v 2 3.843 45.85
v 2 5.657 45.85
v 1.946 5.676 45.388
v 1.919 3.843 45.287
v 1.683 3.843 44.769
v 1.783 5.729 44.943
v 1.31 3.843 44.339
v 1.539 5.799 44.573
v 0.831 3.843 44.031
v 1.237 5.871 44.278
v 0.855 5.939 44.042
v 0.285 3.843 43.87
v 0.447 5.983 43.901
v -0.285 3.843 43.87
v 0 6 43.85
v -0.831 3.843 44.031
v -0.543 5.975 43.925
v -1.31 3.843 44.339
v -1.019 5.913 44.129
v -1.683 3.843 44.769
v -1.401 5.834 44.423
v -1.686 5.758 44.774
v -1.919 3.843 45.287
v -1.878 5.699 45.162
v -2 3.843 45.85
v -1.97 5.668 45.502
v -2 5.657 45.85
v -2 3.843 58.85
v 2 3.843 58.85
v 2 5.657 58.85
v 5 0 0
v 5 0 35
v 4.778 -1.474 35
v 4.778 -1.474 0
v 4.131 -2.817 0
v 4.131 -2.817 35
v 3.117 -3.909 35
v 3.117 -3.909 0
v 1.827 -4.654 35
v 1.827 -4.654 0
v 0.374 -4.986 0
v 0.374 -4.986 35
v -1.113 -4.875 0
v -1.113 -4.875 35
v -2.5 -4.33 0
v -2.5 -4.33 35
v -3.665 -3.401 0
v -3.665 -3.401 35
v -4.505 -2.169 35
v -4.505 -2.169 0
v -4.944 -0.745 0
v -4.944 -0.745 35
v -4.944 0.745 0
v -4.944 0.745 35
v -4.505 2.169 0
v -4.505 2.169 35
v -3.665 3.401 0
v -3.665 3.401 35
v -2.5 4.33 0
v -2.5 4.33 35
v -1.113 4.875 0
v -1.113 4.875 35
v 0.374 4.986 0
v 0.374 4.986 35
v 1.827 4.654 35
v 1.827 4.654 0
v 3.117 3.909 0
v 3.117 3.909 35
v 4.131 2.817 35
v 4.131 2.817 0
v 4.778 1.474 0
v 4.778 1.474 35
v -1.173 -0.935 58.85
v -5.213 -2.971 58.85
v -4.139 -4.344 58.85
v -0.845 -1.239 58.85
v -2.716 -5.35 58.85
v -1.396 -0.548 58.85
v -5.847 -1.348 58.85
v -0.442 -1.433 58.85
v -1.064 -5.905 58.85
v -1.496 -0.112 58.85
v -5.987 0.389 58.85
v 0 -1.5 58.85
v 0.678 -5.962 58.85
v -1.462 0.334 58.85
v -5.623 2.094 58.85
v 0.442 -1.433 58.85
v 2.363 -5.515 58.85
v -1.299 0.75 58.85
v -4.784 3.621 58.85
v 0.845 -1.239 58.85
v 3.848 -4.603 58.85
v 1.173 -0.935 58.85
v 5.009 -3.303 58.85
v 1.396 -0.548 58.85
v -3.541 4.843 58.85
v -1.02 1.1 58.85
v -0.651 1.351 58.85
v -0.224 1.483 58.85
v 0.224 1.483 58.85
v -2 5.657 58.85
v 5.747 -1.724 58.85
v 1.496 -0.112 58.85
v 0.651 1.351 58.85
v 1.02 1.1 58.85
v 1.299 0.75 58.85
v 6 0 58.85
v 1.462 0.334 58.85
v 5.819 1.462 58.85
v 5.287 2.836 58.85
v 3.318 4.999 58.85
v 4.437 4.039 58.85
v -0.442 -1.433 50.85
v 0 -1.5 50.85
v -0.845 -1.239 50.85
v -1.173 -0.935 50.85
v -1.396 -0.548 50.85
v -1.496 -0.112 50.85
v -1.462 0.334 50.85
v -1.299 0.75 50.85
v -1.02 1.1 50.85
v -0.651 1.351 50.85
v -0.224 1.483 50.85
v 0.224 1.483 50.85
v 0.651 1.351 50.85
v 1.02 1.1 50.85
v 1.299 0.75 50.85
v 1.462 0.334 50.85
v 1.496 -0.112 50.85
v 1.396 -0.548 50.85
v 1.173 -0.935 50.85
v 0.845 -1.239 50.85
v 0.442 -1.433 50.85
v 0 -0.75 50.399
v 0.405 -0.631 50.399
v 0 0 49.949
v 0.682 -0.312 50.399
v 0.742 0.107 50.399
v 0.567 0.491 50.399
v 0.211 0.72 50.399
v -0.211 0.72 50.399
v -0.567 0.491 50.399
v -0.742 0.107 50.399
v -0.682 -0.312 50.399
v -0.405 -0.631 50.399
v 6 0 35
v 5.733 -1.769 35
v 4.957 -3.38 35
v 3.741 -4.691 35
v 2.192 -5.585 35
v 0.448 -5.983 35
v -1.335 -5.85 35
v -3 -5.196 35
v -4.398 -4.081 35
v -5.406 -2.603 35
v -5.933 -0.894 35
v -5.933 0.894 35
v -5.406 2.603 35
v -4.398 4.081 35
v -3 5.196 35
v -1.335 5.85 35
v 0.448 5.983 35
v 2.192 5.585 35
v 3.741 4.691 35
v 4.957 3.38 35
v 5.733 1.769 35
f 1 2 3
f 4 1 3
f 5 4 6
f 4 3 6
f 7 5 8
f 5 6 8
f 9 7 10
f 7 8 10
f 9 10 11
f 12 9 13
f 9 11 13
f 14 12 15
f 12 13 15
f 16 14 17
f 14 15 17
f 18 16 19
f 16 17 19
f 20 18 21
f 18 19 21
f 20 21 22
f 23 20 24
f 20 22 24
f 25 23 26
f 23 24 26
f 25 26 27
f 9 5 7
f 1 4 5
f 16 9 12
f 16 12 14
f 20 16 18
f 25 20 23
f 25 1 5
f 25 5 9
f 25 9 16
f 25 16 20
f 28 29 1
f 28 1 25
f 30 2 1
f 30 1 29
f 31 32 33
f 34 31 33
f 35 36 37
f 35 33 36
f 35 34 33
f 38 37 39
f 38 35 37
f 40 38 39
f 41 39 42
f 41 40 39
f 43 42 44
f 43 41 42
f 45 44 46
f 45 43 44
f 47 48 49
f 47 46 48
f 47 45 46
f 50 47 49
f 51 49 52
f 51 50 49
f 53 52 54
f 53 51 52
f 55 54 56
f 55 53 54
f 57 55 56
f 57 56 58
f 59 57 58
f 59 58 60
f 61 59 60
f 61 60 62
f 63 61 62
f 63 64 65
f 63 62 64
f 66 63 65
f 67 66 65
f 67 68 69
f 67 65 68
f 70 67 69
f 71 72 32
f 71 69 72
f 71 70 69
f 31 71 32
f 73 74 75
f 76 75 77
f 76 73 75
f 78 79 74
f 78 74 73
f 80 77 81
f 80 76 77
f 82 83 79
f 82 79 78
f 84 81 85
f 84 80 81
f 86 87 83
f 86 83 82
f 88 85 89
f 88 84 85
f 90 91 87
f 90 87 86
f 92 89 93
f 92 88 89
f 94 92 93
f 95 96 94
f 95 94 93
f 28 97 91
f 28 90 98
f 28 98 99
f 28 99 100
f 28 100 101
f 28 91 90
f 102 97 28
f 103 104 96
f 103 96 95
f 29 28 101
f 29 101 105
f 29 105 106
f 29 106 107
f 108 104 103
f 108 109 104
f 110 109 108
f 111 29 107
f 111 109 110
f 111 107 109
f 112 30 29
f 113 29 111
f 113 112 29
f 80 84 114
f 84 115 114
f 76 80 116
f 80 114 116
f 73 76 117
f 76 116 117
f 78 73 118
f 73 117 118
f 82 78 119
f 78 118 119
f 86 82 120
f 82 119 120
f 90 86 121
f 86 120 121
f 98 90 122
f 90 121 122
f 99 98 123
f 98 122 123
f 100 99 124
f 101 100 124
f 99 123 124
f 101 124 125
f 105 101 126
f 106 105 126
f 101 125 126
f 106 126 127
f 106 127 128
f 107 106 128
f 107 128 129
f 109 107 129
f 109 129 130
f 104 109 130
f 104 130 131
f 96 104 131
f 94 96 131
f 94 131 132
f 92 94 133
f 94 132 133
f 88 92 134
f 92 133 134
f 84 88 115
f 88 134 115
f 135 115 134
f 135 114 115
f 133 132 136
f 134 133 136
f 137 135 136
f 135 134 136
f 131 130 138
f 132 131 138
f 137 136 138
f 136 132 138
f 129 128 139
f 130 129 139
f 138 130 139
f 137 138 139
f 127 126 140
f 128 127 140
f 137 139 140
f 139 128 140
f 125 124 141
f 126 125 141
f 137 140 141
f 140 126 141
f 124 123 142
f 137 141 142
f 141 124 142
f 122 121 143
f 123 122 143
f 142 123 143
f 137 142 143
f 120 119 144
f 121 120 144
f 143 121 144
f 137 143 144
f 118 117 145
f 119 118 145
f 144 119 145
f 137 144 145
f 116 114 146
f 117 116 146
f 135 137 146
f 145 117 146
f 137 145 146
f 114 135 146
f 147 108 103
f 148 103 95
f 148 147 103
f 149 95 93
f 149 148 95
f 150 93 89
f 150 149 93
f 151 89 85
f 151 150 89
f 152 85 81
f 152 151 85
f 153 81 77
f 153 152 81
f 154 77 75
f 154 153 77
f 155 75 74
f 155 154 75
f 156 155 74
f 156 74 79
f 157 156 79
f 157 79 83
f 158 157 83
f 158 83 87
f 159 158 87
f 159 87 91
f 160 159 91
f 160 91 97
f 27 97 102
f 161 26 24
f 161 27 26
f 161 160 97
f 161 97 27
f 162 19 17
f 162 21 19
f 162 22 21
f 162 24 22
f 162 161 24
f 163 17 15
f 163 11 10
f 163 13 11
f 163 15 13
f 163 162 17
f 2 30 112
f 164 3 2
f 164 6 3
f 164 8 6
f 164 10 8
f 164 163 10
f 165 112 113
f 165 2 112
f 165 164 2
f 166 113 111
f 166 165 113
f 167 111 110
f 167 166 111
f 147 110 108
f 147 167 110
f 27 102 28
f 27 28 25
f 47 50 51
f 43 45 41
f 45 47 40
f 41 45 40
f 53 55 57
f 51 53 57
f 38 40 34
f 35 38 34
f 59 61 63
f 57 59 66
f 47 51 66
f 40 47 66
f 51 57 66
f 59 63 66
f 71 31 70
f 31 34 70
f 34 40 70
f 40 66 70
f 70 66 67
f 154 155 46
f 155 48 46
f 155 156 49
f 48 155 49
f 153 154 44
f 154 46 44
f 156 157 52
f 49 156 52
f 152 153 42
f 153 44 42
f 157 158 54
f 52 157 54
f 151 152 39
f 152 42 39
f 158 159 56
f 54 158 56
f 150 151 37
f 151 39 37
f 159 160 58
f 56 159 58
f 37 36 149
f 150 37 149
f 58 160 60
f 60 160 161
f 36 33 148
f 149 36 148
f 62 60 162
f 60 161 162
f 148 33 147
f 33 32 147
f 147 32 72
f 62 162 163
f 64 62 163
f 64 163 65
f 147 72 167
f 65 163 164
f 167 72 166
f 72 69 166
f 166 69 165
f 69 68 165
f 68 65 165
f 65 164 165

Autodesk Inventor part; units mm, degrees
ref_plane "YZ Plane" through (0, 0, 0) normal (1, 0, 0) x (0, 1, 0)
ref_plane "XZ Plane" through (0, 0, 0) normal (0, 1, 0) x (-1, 0, 0)
sketch "スケッチ1" plane through (0, 0, 0) normal (0, 0, 1) x (1, 0, 0)
  point P0 (0, 0)
sketch "スケッチ2" plane through (0, 0, 0) normal (0, 0, 1) x (1, 0, 0)
  circle A0 centre (0, 0) radius 5
  dimension "d0" = 10
extrude "押し出し1" add sketch "スケッチ2" along normal blind 35
thread "ねじ1" size "M10x1.5" class "6g" standard "ANSI Metric M Profile" length 10
sketch "スケッチ3" plane through (0, 0, 35) normal (0, 0, 1) x (1, 0, 0)
  point P0 (0, 0)
sketch "スケッチ4" plane through (0, 0, 35) normal (0, 0, 1) x (1, 0, 0)
  circle A0 centre (0, 0) radius 6
  dimension "d5" = 12
extrude "押し出し2" add sketch "スケッチ4" along normal blind 23.85
sketch "スケッチ5" plane through (0, 0, 58.85) normal (0, 0, 1) x (1, 0, 0)
  line L0 (0, 0) -> (0, 6)
  circle A0 centre (0, 0) radius 6 projected
ref_plane "作業平面1" through (0, 6, 58.85) normal (0, 1, 0) x (-1, 0, 0)
sketch "スケッチ6" plane through (0, 6, 58.85) normal (0, 1, 0) x (-1, 0, 0)
  line L0 (6, 0) -> (-6, 0) projected
  line L1 (-2, 0) -> (2, 0)
  line L2 (2, 0) -> (2, -13)
  line L3 (-2, -13) -> (-2, 0)
  arc A0 (-2, -13) -> (2, -13) centre (0, -13) ccw
  point P0 (0, -58.85)
  point P1 (0, 0)
  dimension "d8" = 2
  dimension "d9" = 2
  dimension "d12" = 4
extrude "押し出し3" cut sketch "スケッチ6" against normal blind 2.157
sketch "スケッチ7" plane through (0, 0, 58.85) normal (0, 0, 1) x (1, 0, 0)
  point P0 (0, 0)
  point P1 (0, 0)
hole "穴1" at (0, 0, 58.85) direction (0, 0, -1) diameter 3 depth 8 tip angle 118
thread "ねじ2" size "M3x0.5" class "6H" standard "ANSI Metric M Profile" full length
properties part number "回転アーム付き計測輪シャフト"
